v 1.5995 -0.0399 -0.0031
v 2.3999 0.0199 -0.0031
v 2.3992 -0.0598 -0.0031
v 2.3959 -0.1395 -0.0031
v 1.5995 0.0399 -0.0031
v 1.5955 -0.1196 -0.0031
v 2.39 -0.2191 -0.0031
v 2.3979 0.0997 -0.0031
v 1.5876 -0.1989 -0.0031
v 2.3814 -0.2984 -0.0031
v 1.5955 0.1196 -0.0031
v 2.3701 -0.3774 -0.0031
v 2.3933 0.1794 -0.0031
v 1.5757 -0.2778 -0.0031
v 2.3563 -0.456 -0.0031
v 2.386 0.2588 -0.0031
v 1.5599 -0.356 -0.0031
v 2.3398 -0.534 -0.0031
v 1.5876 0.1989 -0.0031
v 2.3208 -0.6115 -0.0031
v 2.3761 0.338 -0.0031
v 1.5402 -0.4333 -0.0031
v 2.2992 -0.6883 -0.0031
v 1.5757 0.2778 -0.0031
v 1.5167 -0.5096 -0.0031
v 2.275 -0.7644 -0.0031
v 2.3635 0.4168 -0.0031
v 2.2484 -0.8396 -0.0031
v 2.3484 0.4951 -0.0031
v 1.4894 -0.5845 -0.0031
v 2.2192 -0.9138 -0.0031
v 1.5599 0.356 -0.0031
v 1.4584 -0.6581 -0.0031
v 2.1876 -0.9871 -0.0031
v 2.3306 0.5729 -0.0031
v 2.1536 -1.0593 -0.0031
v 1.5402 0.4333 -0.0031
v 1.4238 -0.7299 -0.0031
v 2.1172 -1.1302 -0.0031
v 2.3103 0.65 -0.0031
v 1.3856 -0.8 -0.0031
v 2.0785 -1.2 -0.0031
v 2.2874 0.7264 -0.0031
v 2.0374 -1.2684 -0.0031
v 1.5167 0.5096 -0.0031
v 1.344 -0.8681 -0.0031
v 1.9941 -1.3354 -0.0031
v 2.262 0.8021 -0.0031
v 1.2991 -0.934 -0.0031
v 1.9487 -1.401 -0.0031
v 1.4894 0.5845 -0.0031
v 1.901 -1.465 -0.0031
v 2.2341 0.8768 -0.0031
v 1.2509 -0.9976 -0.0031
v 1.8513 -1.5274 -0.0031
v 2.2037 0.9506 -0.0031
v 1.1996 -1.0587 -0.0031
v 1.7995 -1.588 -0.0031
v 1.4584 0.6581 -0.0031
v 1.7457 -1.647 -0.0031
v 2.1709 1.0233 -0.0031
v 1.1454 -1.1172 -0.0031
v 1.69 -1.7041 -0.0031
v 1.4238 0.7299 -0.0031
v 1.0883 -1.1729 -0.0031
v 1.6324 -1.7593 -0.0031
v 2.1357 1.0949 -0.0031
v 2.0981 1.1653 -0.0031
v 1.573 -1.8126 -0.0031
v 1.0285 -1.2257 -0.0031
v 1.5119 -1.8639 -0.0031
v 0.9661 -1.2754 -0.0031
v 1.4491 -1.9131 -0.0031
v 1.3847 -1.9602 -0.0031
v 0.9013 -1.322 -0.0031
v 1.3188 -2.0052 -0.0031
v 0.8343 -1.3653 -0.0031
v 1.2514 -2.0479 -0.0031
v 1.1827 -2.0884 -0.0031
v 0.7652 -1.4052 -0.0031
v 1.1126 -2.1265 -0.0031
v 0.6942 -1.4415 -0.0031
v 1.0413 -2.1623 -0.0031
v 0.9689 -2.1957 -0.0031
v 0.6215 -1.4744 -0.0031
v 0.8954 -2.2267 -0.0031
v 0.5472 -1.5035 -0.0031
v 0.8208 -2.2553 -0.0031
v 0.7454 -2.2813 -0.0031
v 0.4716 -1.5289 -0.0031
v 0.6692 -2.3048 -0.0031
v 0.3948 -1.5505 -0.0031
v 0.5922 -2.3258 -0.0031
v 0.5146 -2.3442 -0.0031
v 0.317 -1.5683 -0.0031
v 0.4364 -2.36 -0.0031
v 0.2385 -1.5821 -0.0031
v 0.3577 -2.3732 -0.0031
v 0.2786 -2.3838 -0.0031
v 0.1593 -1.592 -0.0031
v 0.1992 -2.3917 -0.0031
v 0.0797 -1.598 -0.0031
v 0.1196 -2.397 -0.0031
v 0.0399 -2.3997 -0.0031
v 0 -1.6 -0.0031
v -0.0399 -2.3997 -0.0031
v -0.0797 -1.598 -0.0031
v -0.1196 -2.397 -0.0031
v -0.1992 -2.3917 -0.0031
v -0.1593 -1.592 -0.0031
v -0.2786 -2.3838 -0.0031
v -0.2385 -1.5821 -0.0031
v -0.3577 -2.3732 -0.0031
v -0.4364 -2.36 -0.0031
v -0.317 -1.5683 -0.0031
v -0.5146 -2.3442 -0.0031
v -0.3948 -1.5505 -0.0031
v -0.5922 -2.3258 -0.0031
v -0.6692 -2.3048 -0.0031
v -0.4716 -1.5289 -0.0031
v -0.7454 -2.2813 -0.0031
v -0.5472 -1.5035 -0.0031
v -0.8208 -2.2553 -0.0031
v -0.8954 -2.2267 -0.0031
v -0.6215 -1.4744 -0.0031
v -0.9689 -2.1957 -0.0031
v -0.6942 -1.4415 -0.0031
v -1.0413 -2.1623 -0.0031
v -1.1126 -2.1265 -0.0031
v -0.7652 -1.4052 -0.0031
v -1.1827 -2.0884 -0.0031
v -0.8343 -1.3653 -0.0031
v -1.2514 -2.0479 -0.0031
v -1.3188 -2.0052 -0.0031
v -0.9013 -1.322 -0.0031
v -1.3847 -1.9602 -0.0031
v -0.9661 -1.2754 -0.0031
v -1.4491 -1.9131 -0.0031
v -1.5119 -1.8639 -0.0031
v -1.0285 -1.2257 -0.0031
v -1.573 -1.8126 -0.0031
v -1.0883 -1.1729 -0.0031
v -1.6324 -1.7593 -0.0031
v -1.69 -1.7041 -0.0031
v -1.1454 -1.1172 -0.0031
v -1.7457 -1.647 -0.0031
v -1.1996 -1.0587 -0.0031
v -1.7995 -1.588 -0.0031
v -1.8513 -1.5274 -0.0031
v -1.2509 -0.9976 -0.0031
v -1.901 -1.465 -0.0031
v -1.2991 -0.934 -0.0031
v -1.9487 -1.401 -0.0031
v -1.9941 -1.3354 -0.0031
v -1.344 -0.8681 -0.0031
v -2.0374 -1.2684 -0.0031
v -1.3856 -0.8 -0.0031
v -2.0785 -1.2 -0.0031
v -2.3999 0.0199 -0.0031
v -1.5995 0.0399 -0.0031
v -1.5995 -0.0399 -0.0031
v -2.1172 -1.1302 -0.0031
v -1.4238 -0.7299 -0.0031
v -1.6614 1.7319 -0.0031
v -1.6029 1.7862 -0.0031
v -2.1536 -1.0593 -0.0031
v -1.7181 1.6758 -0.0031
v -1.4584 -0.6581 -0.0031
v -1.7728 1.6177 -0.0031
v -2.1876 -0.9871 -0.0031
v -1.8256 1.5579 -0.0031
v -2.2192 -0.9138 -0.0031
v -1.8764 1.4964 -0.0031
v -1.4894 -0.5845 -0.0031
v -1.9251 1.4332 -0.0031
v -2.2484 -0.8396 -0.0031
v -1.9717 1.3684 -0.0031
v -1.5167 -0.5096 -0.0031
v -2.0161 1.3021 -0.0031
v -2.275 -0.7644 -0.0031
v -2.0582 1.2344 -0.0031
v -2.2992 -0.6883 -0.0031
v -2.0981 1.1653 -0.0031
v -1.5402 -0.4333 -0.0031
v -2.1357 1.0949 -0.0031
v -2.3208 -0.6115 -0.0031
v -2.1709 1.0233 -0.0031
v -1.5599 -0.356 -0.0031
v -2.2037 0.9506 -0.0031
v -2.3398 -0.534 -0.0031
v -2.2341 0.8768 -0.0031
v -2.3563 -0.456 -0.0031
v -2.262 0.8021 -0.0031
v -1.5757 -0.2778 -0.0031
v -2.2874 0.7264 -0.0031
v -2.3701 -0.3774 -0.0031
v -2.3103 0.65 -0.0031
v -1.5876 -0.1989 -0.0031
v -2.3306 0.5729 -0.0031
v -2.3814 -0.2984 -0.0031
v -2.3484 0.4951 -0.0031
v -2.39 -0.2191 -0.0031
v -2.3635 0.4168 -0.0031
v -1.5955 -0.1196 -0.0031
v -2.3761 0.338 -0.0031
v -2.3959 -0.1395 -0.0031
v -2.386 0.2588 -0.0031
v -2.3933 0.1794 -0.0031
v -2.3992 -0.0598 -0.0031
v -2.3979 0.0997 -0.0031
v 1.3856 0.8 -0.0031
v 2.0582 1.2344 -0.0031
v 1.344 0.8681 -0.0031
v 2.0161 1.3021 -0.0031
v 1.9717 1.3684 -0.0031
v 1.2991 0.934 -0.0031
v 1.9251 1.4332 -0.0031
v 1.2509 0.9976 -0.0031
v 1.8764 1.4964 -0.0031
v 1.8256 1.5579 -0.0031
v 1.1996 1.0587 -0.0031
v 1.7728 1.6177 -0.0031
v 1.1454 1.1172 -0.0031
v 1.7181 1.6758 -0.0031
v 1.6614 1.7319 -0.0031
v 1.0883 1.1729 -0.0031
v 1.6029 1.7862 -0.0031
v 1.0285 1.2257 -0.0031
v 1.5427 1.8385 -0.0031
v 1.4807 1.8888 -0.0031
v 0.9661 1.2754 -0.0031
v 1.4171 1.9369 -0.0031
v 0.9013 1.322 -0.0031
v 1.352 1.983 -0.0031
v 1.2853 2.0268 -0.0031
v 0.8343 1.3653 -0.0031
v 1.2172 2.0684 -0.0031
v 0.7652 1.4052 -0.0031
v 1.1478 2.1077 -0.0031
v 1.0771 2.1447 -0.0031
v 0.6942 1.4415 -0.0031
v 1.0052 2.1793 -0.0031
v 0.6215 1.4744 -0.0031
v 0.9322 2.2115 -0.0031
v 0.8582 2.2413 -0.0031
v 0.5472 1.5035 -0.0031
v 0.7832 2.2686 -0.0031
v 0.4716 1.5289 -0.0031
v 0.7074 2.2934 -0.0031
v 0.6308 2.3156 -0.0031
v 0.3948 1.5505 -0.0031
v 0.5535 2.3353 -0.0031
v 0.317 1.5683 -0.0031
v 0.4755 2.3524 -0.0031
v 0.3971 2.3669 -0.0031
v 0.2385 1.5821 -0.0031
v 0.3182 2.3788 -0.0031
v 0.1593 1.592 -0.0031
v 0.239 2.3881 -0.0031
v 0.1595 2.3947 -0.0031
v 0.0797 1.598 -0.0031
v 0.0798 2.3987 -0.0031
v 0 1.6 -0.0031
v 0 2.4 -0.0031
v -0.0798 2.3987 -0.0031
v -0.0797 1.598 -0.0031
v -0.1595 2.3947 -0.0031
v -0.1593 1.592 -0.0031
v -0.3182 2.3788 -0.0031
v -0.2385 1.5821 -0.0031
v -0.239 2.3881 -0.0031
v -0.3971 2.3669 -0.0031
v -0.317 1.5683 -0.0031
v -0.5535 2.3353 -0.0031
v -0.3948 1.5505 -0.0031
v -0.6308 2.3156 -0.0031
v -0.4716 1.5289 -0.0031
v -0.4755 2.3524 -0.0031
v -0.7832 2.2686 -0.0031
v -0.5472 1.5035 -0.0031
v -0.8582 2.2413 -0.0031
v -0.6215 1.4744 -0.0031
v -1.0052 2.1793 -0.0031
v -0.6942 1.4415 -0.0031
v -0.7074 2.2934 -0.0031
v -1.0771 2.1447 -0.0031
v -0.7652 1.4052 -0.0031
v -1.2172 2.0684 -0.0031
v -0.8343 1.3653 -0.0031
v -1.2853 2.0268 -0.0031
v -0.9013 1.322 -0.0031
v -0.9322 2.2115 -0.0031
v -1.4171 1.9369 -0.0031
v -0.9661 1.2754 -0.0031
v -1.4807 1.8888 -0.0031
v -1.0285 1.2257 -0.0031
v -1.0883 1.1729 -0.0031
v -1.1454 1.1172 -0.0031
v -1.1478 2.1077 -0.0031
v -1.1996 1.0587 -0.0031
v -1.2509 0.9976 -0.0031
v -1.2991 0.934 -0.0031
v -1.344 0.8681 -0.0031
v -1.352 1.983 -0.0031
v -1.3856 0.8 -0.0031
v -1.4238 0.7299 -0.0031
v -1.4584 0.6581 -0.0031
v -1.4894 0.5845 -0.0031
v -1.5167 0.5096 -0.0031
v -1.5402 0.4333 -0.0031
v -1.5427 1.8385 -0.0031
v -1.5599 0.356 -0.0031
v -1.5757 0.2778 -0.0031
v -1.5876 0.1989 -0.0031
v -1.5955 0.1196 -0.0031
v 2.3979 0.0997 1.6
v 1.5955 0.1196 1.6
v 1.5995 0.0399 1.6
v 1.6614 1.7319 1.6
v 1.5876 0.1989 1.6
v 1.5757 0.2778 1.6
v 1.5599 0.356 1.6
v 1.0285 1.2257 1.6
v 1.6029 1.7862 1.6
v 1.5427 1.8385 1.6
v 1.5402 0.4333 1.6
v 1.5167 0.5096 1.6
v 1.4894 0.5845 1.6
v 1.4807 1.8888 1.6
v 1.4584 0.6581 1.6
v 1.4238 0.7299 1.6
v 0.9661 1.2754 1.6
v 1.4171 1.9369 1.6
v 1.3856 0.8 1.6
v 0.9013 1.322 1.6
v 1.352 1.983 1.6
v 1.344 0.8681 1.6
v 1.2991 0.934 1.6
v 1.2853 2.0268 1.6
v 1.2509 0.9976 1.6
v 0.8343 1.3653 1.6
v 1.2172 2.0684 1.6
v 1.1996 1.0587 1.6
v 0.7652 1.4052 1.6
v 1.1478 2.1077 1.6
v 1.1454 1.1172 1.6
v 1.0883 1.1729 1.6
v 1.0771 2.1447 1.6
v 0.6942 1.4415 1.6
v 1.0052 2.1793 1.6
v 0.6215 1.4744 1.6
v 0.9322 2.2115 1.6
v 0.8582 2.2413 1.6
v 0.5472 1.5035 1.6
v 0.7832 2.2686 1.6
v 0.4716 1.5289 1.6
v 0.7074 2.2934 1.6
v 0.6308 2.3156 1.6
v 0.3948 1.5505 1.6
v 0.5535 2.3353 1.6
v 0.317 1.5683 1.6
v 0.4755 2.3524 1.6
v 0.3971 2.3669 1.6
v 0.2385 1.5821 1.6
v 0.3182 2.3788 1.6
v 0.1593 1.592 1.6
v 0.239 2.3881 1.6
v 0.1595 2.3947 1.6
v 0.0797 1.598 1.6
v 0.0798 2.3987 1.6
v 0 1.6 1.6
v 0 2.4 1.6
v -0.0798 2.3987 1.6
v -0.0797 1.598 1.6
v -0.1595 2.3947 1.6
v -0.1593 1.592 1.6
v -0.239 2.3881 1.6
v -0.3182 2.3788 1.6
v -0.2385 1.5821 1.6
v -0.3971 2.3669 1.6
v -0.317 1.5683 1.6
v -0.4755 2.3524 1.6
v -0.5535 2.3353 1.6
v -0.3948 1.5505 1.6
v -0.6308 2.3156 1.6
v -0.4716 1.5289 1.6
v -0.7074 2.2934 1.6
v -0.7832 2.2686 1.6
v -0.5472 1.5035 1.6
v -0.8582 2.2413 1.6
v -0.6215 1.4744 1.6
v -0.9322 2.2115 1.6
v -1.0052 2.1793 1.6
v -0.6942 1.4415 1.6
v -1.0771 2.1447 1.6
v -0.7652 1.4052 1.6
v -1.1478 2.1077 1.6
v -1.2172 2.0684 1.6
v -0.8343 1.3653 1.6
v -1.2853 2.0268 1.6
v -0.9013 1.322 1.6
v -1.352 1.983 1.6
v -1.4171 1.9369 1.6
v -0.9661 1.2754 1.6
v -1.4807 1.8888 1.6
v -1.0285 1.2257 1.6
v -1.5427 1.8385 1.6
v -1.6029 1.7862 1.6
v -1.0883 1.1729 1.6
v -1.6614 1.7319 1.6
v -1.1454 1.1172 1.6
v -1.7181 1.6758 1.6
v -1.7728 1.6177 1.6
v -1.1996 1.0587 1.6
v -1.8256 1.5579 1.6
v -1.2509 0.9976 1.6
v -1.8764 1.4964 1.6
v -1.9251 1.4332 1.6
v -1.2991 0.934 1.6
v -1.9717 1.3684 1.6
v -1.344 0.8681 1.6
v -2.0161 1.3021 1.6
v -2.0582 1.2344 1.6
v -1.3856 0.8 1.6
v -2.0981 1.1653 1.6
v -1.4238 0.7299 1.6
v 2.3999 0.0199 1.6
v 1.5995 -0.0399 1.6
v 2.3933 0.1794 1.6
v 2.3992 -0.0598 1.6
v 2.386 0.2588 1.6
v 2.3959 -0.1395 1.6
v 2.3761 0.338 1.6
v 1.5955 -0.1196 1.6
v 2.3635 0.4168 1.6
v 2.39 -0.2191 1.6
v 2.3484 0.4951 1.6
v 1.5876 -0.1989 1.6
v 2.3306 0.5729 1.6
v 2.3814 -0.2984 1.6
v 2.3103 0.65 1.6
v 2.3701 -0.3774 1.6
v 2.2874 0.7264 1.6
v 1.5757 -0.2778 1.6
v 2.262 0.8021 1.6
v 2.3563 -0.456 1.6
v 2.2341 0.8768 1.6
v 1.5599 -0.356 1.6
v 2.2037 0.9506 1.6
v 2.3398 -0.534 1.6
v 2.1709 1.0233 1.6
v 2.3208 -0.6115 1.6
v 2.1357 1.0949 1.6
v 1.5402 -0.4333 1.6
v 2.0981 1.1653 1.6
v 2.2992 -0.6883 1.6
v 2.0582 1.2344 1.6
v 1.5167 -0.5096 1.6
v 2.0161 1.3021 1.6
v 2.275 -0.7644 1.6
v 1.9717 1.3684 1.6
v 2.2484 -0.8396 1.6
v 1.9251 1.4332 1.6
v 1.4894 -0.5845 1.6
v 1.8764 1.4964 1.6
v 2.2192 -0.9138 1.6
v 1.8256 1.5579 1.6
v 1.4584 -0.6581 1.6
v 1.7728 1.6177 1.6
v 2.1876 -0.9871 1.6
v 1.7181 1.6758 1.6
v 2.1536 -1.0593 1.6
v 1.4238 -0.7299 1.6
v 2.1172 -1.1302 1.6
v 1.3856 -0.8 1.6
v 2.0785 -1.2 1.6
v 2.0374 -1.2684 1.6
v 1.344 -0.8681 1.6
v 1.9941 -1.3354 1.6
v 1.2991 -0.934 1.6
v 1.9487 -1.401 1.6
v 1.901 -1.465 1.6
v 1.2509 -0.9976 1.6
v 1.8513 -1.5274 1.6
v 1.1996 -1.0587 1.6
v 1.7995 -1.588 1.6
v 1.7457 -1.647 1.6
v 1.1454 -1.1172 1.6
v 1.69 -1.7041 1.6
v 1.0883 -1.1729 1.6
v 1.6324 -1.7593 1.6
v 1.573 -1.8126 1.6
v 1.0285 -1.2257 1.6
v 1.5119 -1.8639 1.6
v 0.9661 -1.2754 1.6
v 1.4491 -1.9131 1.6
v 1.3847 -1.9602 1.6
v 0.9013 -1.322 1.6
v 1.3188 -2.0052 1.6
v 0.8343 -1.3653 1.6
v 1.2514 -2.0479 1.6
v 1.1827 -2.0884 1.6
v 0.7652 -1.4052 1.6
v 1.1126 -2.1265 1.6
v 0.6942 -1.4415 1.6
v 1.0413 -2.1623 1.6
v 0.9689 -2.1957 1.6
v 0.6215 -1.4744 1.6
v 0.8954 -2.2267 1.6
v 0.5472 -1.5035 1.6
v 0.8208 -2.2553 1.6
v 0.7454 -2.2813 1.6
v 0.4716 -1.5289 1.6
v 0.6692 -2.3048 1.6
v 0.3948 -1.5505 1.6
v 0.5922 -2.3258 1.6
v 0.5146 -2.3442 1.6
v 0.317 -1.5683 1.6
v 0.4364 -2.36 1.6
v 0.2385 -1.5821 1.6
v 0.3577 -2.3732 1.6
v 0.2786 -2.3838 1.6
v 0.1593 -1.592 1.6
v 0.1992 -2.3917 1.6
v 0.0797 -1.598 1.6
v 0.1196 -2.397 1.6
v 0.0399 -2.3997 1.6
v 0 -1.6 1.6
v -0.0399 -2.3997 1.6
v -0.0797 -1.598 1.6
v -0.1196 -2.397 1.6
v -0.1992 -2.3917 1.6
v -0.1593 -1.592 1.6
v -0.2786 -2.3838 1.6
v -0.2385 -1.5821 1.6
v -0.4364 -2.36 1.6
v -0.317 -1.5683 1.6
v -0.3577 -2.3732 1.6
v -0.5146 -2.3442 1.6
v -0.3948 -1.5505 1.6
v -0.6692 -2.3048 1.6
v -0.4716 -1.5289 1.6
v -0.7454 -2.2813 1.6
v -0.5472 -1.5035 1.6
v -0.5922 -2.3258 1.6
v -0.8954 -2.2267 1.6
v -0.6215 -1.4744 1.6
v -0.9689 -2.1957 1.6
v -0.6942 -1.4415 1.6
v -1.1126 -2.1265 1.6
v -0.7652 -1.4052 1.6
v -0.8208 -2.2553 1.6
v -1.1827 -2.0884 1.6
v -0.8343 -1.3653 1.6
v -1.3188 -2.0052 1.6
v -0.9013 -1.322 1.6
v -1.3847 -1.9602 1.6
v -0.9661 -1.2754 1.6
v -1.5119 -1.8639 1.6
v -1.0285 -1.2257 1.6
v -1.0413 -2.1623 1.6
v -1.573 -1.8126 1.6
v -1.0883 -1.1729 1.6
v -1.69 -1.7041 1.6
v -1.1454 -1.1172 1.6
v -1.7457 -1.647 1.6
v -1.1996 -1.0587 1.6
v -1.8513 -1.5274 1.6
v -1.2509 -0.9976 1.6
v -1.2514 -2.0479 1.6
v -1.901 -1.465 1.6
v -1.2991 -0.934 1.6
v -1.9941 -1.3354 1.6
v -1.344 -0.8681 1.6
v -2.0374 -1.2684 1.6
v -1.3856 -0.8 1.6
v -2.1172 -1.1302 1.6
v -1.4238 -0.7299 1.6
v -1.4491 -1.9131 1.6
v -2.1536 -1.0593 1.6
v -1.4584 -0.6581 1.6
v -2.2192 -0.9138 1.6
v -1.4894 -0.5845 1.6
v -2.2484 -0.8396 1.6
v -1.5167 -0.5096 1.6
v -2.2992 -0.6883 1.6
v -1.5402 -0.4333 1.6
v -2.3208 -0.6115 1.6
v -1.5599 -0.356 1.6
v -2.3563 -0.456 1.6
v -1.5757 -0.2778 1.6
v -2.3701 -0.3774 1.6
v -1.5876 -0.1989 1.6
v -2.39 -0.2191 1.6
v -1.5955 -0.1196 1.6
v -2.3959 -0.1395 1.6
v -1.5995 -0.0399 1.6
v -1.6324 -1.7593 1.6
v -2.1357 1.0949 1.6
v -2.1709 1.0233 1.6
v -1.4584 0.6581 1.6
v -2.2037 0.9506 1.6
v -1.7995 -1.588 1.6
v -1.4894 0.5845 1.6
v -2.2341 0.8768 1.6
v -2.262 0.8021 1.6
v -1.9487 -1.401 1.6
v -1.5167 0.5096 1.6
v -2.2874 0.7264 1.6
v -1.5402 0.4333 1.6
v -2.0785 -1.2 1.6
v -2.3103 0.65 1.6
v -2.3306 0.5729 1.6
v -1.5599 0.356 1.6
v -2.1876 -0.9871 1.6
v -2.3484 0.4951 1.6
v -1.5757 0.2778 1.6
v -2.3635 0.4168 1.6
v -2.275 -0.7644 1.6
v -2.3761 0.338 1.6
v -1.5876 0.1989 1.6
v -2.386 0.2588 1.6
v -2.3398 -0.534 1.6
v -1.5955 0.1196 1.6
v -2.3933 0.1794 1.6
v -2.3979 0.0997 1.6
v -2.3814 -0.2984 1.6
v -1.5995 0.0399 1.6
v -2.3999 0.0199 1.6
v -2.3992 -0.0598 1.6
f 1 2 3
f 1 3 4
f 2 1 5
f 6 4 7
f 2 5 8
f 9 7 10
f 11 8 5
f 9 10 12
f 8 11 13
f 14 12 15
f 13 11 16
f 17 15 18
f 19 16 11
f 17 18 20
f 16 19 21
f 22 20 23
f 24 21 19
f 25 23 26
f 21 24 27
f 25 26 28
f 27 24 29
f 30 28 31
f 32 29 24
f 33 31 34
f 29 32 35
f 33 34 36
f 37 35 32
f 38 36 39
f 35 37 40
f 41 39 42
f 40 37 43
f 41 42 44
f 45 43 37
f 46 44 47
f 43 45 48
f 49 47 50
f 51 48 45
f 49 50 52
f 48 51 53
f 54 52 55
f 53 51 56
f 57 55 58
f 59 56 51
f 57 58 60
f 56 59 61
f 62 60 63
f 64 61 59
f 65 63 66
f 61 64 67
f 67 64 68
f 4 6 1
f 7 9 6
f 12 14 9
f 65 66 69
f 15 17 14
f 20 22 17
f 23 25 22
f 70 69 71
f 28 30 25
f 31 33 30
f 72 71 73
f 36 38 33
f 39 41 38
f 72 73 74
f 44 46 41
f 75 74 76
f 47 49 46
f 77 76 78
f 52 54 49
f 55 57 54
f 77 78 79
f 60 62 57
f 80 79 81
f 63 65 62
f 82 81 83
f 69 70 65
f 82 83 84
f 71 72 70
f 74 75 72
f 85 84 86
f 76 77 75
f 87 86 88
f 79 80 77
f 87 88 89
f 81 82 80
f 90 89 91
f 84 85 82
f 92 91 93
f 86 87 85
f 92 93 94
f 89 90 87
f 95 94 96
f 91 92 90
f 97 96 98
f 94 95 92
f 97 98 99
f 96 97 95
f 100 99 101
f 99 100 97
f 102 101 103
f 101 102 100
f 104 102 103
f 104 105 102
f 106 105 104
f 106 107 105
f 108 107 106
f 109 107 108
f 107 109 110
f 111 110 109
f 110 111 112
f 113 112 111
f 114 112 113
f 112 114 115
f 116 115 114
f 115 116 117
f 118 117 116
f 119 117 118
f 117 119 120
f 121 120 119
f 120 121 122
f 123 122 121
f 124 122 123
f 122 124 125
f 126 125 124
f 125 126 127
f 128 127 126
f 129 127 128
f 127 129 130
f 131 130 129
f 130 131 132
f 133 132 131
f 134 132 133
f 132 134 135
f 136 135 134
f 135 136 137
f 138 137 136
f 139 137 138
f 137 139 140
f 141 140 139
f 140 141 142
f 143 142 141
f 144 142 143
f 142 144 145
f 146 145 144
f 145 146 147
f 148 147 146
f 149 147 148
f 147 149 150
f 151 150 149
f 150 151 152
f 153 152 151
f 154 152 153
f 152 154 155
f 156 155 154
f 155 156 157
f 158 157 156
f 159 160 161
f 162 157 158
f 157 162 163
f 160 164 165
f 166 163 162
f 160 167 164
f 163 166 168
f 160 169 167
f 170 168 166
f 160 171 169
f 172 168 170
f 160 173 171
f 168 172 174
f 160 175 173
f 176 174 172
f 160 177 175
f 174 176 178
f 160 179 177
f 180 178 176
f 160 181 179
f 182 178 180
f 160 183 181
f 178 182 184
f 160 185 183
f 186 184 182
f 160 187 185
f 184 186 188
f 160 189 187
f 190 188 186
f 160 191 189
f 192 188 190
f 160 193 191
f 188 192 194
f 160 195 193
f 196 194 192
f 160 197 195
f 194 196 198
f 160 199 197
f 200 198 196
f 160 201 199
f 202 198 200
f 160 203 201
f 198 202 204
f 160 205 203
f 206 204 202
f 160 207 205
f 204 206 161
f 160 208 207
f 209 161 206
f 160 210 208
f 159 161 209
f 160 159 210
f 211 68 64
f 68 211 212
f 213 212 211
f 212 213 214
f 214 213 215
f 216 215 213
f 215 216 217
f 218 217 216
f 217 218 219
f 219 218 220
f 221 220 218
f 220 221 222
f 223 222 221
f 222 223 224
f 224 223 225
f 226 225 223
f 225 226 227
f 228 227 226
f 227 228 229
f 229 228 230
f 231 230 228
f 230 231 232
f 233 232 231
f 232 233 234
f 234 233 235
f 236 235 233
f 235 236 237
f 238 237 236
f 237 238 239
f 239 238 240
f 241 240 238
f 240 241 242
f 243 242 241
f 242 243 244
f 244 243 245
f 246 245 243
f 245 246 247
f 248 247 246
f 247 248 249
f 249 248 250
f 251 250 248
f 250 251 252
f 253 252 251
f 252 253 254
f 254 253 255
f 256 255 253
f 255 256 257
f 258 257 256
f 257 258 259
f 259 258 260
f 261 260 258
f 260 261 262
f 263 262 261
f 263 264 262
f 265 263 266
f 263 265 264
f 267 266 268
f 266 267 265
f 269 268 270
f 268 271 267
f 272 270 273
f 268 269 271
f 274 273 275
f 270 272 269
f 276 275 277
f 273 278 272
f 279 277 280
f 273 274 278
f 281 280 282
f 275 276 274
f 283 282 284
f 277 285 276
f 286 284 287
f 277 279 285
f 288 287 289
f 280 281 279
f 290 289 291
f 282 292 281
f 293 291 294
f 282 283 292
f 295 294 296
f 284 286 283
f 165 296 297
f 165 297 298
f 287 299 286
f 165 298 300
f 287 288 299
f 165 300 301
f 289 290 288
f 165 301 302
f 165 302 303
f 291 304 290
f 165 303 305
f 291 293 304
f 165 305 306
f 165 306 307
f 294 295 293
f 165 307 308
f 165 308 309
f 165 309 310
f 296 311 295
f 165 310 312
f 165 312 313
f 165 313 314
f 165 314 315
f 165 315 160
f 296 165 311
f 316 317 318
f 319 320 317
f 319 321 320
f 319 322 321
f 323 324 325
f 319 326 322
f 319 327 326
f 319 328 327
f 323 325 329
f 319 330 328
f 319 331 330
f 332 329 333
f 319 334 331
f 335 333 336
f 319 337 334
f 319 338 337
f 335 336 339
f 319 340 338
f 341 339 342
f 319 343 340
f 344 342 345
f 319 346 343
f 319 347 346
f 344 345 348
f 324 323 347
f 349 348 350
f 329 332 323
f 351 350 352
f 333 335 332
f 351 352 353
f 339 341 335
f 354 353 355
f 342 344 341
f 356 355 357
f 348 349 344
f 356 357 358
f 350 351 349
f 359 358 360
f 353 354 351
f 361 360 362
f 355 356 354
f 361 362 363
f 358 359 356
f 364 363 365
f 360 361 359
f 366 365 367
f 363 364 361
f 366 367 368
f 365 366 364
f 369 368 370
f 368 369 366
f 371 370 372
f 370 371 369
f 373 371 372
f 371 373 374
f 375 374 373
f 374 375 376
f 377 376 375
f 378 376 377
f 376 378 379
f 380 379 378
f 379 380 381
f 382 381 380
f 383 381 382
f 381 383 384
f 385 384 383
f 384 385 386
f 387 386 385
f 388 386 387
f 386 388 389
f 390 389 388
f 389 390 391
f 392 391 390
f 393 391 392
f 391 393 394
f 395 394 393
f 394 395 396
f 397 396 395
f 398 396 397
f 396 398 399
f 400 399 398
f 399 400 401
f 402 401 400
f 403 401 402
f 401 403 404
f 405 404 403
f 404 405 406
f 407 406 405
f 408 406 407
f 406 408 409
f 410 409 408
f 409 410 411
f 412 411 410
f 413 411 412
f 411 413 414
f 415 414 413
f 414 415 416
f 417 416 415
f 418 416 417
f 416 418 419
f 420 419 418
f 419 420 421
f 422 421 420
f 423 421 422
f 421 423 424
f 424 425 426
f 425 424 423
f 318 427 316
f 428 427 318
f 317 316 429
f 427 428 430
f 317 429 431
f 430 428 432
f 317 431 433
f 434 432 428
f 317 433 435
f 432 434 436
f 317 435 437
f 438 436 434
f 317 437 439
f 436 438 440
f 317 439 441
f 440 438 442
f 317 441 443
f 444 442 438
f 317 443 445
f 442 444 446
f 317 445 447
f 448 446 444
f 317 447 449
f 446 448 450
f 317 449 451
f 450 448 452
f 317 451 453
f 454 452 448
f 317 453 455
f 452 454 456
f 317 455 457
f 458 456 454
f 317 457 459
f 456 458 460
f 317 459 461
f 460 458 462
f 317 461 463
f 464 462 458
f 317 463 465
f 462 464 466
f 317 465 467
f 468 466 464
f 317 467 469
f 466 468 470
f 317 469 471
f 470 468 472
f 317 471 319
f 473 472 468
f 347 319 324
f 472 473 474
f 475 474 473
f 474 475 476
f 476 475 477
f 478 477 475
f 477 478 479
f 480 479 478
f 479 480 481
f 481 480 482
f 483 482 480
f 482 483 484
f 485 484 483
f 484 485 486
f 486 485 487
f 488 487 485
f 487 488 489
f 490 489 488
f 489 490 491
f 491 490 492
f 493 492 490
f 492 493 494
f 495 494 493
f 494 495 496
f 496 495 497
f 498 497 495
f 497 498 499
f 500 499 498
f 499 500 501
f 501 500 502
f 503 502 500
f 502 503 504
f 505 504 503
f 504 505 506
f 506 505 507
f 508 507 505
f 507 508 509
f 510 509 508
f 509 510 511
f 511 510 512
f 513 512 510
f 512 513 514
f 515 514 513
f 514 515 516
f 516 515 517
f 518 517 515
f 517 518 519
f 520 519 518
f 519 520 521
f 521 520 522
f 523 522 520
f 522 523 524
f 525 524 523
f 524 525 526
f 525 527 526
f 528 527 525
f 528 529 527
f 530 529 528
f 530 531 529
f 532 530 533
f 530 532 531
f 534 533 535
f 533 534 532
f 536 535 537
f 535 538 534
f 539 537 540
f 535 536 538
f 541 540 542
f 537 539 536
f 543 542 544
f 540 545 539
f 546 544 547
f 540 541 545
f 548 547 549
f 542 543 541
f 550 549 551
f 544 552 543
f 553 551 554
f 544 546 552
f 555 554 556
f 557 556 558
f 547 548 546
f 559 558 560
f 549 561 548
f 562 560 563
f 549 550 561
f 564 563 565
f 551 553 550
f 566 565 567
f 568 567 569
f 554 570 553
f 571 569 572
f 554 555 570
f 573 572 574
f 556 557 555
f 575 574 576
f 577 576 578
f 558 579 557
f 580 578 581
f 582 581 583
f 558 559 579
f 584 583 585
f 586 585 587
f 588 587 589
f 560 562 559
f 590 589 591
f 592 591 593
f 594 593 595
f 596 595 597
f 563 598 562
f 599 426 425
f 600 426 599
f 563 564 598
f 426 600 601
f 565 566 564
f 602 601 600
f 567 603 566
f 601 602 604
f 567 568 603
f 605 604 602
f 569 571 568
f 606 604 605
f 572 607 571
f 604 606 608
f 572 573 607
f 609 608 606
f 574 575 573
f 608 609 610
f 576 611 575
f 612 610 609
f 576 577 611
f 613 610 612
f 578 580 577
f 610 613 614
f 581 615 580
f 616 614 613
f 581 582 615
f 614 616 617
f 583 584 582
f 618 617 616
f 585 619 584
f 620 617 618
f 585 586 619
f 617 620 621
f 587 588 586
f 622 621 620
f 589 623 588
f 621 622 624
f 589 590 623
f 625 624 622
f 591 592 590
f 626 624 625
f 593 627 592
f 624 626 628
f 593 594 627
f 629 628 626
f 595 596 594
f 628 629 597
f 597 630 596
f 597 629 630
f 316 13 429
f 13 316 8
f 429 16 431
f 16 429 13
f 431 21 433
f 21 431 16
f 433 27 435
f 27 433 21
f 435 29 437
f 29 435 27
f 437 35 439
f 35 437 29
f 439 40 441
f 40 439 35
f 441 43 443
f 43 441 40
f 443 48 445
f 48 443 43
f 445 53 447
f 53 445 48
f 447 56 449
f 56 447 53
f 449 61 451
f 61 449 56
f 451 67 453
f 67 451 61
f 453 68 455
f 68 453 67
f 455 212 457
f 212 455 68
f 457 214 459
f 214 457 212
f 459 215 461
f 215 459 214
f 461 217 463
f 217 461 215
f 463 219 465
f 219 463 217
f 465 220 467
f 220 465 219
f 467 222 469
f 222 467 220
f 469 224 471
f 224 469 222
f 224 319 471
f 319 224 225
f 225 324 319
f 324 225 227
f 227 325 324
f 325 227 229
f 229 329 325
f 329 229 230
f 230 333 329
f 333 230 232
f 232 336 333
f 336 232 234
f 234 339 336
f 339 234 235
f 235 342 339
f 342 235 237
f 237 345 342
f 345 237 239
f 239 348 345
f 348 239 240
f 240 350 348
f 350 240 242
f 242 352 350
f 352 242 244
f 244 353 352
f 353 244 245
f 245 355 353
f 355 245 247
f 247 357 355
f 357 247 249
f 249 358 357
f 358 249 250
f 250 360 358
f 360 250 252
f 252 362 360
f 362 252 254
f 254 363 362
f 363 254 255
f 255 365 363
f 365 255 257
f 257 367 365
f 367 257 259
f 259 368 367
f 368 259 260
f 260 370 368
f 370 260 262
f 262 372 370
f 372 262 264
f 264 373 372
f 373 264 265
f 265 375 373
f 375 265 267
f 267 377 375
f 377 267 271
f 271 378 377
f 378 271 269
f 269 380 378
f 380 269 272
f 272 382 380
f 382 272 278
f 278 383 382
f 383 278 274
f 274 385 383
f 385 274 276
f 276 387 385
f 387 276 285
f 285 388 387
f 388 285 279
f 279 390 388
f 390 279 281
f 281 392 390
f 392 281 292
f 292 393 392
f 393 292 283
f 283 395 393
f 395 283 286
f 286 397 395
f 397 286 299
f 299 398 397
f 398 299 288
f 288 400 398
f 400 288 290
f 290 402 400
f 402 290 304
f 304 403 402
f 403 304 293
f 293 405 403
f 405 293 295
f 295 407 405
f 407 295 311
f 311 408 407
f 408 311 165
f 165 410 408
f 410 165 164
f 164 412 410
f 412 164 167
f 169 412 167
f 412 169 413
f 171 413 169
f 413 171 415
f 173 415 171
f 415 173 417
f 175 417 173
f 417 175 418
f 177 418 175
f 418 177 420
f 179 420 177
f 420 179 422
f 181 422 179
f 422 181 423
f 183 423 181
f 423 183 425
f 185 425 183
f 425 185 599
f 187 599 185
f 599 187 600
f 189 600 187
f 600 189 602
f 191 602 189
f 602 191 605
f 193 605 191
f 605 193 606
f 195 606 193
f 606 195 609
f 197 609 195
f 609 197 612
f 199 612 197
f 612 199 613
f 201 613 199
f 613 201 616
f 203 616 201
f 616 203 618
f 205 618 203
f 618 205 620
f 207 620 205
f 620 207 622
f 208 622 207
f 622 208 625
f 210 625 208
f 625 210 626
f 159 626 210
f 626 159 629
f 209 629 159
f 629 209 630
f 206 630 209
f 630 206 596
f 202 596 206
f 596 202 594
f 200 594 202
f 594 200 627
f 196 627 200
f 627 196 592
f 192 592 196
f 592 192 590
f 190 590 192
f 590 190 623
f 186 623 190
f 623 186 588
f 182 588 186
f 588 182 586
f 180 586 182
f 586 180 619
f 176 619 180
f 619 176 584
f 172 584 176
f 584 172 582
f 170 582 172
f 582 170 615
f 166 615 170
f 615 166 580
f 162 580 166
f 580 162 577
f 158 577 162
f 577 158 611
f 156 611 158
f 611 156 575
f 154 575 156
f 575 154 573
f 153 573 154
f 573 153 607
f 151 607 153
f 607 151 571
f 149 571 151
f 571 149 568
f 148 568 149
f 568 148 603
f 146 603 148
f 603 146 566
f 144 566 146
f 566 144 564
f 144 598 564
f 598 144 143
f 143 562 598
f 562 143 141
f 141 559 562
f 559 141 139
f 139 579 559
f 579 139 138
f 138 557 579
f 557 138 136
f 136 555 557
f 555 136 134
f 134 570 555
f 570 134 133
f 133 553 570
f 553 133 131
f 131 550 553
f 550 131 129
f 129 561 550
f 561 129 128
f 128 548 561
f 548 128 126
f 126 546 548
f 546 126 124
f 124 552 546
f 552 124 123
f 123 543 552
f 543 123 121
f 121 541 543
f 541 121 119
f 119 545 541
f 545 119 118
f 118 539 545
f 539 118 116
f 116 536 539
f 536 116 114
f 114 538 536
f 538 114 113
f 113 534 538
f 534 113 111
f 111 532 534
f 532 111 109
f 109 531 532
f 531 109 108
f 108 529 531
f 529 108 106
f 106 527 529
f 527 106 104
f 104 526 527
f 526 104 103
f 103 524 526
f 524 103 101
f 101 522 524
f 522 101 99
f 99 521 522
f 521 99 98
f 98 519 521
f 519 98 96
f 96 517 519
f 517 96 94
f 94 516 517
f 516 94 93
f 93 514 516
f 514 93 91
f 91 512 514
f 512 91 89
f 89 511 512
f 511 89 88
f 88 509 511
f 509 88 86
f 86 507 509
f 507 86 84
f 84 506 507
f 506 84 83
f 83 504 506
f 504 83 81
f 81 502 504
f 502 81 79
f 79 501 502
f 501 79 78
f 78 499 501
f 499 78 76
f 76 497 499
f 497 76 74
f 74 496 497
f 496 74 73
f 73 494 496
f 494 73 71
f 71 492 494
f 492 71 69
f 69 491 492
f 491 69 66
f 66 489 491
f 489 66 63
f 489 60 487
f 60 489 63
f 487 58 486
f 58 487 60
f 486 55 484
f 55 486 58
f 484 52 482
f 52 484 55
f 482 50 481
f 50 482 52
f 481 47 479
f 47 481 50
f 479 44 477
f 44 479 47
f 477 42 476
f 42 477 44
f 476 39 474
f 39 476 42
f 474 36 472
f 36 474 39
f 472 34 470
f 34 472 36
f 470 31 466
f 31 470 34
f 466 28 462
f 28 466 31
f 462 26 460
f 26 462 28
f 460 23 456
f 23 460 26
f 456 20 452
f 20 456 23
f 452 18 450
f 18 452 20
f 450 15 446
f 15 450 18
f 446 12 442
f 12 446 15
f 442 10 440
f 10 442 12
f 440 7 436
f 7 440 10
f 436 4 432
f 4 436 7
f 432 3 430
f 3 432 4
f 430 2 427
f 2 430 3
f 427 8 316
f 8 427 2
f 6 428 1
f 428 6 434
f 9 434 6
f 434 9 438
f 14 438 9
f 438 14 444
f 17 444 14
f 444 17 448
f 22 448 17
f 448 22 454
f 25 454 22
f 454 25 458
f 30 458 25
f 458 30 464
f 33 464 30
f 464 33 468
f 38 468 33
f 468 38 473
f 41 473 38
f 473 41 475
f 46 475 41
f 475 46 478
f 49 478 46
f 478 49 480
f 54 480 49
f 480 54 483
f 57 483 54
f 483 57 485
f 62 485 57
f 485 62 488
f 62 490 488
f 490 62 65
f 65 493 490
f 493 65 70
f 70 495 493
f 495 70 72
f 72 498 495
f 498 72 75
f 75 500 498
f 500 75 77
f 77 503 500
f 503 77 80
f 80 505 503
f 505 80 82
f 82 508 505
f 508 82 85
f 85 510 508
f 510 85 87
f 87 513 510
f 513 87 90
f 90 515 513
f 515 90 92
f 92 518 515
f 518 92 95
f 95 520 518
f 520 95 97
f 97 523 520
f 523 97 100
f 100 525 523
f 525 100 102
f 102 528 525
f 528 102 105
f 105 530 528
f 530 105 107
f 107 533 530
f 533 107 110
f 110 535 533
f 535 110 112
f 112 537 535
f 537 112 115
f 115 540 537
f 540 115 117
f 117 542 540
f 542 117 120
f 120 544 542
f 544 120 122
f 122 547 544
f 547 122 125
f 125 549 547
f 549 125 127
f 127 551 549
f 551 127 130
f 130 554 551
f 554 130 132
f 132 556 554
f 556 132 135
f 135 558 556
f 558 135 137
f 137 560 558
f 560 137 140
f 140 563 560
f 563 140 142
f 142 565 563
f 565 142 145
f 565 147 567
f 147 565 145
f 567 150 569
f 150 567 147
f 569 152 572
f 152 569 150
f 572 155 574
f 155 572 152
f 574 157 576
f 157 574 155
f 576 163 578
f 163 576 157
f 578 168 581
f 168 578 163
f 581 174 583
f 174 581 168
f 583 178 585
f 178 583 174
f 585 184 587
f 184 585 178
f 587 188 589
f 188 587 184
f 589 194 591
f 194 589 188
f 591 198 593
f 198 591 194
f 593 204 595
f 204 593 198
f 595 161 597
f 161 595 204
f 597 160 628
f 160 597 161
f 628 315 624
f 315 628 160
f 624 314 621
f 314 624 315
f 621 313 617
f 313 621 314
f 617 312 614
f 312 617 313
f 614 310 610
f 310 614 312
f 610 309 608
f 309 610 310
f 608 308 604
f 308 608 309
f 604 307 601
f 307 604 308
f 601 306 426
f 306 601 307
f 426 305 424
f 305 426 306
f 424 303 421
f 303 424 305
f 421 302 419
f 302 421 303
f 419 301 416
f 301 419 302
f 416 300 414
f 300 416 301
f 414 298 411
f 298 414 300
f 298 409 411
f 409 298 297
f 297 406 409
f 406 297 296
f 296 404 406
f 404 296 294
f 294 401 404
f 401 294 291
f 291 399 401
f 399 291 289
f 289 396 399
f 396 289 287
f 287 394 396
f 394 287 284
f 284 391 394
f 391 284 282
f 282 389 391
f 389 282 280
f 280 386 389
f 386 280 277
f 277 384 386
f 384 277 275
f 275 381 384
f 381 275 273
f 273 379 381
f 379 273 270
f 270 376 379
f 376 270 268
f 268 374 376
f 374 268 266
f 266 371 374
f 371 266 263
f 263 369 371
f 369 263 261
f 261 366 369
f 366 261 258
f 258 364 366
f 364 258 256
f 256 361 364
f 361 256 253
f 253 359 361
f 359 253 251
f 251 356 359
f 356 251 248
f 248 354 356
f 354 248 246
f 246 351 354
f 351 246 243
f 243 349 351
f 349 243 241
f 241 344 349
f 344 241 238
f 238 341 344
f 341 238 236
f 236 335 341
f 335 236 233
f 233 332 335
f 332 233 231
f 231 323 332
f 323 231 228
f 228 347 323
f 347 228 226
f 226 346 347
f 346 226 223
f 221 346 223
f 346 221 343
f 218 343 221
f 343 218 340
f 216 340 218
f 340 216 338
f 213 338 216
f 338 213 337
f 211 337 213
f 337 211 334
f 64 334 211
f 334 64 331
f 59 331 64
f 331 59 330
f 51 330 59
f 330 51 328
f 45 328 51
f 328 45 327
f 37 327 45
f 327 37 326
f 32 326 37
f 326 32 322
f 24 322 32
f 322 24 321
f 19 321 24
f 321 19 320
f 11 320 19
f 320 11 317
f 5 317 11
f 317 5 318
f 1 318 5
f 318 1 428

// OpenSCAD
use <../lib.scad>
use <s/92262s01.scad>
use <../p/stud2.scad>
$fa=1; $fs=0.2;
function ldraw_lib__92263(realsolid=false) = [
// 0 Door  1 x  3 x  2 Right with Hollow Hinge
// 0 Name: 92263.dat
// 0 Author: Rolf Osterthun [Rolf]
// 0 !LDRAW_ORG Part UPDATE 2011-02
// 0 !LICENSE Licensed under CC BY 2.0 and CC BY 4.0 : see CAreadme.txt
// 
// 0 BFC CERTIFY CCW
  [0,"BFC","CERTIFY"],
  [0,"BFC","CCW"],
// 
// 0 !HISTORY 2011-12-29 [PTadmin] Official Update 2011-02
// 
// 
// 1 16 0 0 0 -1 0 0 0 1 0 0 0 1 s\92262s01.dat
  [1,16,0,0,0,-1,0,0,0,1,0,0,0,1, ldraw_lib__s__92262s01(realsolid)],
// 1 16 0 0 0 -1 0 0 0 1 0 0 0 -1 stud2.dat
  [1,16,0,0,0,-1,0,0,0,1,0,0,0,-1, ldraw_lib__stud2(realsolid)],
];
module ldraw_lib__92263(step=0, col=false, unit=2/5, alt=false, line=0.2, solid=!$preview)
    makepoly(ldraw_lib__92263(solid), step=step, col=col, unit=unit, alt=alt, line=line, solid=solid);
ldraw_lib__92263(line=0.2);
